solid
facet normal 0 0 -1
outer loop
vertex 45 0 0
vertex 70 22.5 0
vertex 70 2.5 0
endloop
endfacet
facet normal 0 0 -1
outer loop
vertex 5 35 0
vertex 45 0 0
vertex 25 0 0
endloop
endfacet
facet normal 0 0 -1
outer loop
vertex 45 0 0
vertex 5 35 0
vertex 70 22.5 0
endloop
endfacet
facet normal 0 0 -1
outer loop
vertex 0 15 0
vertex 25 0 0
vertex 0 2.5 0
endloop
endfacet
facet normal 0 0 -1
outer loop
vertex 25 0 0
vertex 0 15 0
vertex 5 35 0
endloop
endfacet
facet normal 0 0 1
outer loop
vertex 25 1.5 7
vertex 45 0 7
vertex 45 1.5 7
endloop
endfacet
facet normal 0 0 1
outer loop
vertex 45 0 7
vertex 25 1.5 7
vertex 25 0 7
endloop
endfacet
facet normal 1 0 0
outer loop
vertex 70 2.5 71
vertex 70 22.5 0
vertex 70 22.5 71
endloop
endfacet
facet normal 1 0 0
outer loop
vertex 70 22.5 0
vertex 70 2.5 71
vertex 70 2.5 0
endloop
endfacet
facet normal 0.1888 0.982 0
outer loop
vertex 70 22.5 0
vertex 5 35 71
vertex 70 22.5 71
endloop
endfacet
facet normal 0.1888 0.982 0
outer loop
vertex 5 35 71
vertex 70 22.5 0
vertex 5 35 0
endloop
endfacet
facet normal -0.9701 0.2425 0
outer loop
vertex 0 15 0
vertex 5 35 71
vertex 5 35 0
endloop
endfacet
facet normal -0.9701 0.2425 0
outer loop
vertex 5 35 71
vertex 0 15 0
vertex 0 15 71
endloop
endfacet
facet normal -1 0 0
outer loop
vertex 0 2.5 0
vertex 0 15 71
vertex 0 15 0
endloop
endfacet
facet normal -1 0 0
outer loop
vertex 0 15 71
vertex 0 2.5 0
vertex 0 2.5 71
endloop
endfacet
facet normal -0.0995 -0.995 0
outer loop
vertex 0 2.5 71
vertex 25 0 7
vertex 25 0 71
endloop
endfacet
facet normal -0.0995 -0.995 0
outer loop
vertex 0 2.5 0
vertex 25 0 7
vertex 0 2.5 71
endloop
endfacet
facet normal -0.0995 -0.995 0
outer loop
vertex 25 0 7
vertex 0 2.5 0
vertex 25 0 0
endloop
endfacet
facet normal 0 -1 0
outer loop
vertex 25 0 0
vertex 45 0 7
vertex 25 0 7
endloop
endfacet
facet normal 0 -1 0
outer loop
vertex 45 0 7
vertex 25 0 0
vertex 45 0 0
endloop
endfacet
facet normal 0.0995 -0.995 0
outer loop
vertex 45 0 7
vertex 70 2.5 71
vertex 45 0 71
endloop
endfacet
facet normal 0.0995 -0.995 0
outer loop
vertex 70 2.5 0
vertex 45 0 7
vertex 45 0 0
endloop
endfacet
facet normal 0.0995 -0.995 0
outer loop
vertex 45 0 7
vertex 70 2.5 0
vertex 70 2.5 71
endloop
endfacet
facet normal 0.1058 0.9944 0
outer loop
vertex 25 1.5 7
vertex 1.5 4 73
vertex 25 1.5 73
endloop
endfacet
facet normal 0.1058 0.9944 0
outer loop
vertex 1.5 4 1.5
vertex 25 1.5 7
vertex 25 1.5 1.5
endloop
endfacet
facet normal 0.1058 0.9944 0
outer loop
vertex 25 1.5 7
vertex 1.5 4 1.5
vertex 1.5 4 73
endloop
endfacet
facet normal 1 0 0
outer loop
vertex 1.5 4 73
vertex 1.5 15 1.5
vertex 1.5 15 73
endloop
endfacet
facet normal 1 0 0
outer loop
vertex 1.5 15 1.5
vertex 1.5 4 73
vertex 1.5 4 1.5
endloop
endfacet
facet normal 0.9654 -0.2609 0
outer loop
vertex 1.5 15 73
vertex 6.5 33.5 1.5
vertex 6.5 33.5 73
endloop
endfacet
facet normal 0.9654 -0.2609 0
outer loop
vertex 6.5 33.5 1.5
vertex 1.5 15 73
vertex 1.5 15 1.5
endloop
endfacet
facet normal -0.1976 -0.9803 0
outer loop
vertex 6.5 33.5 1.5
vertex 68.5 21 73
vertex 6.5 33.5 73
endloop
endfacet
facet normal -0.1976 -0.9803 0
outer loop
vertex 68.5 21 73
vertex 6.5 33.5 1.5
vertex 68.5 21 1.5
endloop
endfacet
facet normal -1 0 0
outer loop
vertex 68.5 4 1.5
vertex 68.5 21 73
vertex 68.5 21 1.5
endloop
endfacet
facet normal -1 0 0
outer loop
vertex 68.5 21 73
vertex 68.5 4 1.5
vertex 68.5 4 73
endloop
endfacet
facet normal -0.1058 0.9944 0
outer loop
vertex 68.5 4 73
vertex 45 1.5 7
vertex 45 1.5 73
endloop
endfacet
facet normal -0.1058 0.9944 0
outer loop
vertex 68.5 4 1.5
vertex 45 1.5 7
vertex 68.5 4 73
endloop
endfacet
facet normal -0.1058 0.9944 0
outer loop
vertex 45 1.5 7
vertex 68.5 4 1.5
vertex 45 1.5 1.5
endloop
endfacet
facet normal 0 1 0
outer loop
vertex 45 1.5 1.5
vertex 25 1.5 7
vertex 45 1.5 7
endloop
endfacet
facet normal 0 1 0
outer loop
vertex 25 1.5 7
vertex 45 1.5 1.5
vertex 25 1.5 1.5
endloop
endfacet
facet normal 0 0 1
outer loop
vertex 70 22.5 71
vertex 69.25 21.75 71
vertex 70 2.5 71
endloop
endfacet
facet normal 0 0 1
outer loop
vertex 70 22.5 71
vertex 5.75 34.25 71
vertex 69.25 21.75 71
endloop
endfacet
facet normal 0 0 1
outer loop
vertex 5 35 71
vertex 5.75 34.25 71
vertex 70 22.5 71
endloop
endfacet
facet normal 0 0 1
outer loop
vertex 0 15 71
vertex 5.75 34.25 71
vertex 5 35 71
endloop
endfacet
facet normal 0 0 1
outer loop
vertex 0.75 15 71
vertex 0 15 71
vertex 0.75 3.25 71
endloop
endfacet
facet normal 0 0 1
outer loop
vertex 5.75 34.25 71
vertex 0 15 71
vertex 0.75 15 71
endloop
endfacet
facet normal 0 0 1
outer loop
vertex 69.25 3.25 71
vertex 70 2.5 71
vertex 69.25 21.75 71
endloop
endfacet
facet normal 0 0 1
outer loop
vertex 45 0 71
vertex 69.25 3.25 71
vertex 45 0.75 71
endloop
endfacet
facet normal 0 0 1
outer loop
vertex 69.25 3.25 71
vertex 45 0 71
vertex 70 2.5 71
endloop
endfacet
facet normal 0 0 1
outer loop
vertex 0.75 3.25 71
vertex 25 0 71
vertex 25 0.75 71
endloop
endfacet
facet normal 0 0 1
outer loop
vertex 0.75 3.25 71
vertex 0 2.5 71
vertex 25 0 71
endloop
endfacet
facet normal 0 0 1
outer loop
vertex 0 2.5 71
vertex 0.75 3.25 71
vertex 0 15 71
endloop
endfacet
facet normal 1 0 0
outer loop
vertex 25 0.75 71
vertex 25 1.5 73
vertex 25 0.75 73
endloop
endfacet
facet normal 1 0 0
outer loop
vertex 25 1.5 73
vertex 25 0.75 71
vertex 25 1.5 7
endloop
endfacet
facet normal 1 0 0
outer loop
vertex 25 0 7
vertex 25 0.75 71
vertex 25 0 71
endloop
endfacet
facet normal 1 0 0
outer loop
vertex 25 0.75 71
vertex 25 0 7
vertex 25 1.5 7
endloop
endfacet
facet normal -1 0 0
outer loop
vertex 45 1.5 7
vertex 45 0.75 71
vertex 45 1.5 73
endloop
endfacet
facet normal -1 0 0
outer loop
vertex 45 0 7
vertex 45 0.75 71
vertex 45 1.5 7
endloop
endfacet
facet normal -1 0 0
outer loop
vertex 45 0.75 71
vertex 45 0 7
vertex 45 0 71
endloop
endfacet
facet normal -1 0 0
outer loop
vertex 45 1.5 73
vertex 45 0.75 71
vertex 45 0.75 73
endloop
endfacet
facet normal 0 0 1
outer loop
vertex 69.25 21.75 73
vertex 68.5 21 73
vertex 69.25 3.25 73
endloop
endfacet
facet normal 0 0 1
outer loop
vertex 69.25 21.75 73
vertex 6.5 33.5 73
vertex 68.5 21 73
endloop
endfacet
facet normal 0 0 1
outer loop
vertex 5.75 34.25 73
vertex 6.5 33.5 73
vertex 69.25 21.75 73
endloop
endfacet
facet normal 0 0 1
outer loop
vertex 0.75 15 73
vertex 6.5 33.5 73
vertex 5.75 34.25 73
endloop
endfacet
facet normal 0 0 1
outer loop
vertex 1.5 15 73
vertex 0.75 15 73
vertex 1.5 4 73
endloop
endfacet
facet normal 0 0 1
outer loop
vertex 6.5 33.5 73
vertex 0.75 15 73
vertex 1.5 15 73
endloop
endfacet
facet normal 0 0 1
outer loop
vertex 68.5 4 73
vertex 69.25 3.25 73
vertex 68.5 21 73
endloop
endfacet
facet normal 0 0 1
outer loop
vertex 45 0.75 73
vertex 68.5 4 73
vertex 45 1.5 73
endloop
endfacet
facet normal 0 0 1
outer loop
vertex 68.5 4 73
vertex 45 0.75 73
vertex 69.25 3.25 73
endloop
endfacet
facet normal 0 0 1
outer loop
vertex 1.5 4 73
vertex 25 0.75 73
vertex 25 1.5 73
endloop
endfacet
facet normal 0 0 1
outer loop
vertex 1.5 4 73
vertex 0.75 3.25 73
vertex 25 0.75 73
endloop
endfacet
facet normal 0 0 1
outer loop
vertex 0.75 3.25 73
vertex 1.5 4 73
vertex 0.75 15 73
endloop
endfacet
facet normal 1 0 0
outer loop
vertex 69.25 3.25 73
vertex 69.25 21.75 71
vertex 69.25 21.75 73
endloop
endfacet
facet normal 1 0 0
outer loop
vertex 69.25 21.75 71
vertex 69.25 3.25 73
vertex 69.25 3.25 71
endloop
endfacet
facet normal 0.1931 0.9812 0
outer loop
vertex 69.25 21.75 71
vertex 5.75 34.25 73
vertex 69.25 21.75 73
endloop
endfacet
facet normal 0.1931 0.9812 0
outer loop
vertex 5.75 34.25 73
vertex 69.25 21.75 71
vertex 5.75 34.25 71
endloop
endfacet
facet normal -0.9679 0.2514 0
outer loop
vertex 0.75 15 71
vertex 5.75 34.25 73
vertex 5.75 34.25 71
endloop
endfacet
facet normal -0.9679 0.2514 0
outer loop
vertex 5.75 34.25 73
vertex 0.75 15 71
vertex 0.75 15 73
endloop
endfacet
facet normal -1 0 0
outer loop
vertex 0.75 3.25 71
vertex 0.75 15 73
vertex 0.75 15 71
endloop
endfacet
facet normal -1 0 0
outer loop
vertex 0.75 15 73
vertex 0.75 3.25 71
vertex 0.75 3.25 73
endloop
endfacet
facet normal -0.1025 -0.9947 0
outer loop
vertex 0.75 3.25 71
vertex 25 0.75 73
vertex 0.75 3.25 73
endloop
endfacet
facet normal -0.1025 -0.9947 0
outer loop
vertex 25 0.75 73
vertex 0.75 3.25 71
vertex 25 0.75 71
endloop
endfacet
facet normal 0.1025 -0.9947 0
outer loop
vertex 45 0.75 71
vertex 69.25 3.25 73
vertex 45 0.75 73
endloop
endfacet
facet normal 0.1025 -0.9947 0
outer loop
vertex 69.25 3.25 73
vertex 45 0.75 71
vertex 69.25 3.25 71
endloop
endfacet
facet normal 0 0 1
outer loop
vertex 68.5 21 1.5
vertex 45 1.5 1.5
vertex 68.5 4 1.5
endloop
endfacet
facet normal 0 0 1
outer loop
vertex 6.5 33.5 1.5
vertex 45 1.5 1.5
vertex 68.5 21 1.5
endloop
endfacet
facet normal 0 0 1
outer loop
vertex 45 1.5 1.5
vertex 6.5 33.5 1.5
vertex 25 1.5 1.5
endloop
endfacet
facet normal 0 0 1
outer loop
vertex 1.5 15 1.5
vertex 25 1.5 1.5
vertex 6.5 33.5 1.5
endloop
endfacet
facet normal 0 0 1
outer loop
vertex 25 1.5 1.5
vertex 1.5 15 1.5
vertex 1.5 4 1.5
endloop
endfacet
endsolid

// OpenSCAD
a=2.5;
b=25;
c=20;
d=20;
e=5;
f=20;
g=15;
x=1.5;
y = .75;
p = [
[0, a],   [b, 0], [b+c, 0], [2*b+c, a],   [2*b+c, a+d],     [e, g+f],   [0, g], 
[x, a+x], [b, x], [b+c, x], [2*b+c-x, a+x], [2*b+c-x, a+d-x], [e+x, g+f-x], [x, g]];
p2 = [
[y, a+y], [b, y], [b+c, y], [2*b+c-y, a+y], [2*b+c-y, a+d-y], [e+y, g+f-y], [y, g], 
[x, a+x], [b, x], [b+c, x], [2*b+c-x, a+x], [2*b+c-x, a+d-x], [e+x, g+f-x], [x, g]];
linear_extrude(height=7){
polygon(points=p,
 paths=[[0, 1, 2, 3, 4, 5, 6], [7, 8, 9, 10, 11, 12, 13]]);

}
linear_extrude(height=71){
polygon(points=p,
 paths=[[0, 1, 8, 7, 13, 12, 11, 10, 9, 2, 3, 4, 5, 6]]);

}
linear_extrude(height=73){
polygon(points=p2,
 paths=[[0, 1, 8, 7, 13, 12, 11, 10, 9, 2, 3, 4, 5, 6]]);

}
linear_extrude(height=x){
polygon(points=p,
 paths=[[0, 1, 2, 3, 4, 5, 6]]);
}
